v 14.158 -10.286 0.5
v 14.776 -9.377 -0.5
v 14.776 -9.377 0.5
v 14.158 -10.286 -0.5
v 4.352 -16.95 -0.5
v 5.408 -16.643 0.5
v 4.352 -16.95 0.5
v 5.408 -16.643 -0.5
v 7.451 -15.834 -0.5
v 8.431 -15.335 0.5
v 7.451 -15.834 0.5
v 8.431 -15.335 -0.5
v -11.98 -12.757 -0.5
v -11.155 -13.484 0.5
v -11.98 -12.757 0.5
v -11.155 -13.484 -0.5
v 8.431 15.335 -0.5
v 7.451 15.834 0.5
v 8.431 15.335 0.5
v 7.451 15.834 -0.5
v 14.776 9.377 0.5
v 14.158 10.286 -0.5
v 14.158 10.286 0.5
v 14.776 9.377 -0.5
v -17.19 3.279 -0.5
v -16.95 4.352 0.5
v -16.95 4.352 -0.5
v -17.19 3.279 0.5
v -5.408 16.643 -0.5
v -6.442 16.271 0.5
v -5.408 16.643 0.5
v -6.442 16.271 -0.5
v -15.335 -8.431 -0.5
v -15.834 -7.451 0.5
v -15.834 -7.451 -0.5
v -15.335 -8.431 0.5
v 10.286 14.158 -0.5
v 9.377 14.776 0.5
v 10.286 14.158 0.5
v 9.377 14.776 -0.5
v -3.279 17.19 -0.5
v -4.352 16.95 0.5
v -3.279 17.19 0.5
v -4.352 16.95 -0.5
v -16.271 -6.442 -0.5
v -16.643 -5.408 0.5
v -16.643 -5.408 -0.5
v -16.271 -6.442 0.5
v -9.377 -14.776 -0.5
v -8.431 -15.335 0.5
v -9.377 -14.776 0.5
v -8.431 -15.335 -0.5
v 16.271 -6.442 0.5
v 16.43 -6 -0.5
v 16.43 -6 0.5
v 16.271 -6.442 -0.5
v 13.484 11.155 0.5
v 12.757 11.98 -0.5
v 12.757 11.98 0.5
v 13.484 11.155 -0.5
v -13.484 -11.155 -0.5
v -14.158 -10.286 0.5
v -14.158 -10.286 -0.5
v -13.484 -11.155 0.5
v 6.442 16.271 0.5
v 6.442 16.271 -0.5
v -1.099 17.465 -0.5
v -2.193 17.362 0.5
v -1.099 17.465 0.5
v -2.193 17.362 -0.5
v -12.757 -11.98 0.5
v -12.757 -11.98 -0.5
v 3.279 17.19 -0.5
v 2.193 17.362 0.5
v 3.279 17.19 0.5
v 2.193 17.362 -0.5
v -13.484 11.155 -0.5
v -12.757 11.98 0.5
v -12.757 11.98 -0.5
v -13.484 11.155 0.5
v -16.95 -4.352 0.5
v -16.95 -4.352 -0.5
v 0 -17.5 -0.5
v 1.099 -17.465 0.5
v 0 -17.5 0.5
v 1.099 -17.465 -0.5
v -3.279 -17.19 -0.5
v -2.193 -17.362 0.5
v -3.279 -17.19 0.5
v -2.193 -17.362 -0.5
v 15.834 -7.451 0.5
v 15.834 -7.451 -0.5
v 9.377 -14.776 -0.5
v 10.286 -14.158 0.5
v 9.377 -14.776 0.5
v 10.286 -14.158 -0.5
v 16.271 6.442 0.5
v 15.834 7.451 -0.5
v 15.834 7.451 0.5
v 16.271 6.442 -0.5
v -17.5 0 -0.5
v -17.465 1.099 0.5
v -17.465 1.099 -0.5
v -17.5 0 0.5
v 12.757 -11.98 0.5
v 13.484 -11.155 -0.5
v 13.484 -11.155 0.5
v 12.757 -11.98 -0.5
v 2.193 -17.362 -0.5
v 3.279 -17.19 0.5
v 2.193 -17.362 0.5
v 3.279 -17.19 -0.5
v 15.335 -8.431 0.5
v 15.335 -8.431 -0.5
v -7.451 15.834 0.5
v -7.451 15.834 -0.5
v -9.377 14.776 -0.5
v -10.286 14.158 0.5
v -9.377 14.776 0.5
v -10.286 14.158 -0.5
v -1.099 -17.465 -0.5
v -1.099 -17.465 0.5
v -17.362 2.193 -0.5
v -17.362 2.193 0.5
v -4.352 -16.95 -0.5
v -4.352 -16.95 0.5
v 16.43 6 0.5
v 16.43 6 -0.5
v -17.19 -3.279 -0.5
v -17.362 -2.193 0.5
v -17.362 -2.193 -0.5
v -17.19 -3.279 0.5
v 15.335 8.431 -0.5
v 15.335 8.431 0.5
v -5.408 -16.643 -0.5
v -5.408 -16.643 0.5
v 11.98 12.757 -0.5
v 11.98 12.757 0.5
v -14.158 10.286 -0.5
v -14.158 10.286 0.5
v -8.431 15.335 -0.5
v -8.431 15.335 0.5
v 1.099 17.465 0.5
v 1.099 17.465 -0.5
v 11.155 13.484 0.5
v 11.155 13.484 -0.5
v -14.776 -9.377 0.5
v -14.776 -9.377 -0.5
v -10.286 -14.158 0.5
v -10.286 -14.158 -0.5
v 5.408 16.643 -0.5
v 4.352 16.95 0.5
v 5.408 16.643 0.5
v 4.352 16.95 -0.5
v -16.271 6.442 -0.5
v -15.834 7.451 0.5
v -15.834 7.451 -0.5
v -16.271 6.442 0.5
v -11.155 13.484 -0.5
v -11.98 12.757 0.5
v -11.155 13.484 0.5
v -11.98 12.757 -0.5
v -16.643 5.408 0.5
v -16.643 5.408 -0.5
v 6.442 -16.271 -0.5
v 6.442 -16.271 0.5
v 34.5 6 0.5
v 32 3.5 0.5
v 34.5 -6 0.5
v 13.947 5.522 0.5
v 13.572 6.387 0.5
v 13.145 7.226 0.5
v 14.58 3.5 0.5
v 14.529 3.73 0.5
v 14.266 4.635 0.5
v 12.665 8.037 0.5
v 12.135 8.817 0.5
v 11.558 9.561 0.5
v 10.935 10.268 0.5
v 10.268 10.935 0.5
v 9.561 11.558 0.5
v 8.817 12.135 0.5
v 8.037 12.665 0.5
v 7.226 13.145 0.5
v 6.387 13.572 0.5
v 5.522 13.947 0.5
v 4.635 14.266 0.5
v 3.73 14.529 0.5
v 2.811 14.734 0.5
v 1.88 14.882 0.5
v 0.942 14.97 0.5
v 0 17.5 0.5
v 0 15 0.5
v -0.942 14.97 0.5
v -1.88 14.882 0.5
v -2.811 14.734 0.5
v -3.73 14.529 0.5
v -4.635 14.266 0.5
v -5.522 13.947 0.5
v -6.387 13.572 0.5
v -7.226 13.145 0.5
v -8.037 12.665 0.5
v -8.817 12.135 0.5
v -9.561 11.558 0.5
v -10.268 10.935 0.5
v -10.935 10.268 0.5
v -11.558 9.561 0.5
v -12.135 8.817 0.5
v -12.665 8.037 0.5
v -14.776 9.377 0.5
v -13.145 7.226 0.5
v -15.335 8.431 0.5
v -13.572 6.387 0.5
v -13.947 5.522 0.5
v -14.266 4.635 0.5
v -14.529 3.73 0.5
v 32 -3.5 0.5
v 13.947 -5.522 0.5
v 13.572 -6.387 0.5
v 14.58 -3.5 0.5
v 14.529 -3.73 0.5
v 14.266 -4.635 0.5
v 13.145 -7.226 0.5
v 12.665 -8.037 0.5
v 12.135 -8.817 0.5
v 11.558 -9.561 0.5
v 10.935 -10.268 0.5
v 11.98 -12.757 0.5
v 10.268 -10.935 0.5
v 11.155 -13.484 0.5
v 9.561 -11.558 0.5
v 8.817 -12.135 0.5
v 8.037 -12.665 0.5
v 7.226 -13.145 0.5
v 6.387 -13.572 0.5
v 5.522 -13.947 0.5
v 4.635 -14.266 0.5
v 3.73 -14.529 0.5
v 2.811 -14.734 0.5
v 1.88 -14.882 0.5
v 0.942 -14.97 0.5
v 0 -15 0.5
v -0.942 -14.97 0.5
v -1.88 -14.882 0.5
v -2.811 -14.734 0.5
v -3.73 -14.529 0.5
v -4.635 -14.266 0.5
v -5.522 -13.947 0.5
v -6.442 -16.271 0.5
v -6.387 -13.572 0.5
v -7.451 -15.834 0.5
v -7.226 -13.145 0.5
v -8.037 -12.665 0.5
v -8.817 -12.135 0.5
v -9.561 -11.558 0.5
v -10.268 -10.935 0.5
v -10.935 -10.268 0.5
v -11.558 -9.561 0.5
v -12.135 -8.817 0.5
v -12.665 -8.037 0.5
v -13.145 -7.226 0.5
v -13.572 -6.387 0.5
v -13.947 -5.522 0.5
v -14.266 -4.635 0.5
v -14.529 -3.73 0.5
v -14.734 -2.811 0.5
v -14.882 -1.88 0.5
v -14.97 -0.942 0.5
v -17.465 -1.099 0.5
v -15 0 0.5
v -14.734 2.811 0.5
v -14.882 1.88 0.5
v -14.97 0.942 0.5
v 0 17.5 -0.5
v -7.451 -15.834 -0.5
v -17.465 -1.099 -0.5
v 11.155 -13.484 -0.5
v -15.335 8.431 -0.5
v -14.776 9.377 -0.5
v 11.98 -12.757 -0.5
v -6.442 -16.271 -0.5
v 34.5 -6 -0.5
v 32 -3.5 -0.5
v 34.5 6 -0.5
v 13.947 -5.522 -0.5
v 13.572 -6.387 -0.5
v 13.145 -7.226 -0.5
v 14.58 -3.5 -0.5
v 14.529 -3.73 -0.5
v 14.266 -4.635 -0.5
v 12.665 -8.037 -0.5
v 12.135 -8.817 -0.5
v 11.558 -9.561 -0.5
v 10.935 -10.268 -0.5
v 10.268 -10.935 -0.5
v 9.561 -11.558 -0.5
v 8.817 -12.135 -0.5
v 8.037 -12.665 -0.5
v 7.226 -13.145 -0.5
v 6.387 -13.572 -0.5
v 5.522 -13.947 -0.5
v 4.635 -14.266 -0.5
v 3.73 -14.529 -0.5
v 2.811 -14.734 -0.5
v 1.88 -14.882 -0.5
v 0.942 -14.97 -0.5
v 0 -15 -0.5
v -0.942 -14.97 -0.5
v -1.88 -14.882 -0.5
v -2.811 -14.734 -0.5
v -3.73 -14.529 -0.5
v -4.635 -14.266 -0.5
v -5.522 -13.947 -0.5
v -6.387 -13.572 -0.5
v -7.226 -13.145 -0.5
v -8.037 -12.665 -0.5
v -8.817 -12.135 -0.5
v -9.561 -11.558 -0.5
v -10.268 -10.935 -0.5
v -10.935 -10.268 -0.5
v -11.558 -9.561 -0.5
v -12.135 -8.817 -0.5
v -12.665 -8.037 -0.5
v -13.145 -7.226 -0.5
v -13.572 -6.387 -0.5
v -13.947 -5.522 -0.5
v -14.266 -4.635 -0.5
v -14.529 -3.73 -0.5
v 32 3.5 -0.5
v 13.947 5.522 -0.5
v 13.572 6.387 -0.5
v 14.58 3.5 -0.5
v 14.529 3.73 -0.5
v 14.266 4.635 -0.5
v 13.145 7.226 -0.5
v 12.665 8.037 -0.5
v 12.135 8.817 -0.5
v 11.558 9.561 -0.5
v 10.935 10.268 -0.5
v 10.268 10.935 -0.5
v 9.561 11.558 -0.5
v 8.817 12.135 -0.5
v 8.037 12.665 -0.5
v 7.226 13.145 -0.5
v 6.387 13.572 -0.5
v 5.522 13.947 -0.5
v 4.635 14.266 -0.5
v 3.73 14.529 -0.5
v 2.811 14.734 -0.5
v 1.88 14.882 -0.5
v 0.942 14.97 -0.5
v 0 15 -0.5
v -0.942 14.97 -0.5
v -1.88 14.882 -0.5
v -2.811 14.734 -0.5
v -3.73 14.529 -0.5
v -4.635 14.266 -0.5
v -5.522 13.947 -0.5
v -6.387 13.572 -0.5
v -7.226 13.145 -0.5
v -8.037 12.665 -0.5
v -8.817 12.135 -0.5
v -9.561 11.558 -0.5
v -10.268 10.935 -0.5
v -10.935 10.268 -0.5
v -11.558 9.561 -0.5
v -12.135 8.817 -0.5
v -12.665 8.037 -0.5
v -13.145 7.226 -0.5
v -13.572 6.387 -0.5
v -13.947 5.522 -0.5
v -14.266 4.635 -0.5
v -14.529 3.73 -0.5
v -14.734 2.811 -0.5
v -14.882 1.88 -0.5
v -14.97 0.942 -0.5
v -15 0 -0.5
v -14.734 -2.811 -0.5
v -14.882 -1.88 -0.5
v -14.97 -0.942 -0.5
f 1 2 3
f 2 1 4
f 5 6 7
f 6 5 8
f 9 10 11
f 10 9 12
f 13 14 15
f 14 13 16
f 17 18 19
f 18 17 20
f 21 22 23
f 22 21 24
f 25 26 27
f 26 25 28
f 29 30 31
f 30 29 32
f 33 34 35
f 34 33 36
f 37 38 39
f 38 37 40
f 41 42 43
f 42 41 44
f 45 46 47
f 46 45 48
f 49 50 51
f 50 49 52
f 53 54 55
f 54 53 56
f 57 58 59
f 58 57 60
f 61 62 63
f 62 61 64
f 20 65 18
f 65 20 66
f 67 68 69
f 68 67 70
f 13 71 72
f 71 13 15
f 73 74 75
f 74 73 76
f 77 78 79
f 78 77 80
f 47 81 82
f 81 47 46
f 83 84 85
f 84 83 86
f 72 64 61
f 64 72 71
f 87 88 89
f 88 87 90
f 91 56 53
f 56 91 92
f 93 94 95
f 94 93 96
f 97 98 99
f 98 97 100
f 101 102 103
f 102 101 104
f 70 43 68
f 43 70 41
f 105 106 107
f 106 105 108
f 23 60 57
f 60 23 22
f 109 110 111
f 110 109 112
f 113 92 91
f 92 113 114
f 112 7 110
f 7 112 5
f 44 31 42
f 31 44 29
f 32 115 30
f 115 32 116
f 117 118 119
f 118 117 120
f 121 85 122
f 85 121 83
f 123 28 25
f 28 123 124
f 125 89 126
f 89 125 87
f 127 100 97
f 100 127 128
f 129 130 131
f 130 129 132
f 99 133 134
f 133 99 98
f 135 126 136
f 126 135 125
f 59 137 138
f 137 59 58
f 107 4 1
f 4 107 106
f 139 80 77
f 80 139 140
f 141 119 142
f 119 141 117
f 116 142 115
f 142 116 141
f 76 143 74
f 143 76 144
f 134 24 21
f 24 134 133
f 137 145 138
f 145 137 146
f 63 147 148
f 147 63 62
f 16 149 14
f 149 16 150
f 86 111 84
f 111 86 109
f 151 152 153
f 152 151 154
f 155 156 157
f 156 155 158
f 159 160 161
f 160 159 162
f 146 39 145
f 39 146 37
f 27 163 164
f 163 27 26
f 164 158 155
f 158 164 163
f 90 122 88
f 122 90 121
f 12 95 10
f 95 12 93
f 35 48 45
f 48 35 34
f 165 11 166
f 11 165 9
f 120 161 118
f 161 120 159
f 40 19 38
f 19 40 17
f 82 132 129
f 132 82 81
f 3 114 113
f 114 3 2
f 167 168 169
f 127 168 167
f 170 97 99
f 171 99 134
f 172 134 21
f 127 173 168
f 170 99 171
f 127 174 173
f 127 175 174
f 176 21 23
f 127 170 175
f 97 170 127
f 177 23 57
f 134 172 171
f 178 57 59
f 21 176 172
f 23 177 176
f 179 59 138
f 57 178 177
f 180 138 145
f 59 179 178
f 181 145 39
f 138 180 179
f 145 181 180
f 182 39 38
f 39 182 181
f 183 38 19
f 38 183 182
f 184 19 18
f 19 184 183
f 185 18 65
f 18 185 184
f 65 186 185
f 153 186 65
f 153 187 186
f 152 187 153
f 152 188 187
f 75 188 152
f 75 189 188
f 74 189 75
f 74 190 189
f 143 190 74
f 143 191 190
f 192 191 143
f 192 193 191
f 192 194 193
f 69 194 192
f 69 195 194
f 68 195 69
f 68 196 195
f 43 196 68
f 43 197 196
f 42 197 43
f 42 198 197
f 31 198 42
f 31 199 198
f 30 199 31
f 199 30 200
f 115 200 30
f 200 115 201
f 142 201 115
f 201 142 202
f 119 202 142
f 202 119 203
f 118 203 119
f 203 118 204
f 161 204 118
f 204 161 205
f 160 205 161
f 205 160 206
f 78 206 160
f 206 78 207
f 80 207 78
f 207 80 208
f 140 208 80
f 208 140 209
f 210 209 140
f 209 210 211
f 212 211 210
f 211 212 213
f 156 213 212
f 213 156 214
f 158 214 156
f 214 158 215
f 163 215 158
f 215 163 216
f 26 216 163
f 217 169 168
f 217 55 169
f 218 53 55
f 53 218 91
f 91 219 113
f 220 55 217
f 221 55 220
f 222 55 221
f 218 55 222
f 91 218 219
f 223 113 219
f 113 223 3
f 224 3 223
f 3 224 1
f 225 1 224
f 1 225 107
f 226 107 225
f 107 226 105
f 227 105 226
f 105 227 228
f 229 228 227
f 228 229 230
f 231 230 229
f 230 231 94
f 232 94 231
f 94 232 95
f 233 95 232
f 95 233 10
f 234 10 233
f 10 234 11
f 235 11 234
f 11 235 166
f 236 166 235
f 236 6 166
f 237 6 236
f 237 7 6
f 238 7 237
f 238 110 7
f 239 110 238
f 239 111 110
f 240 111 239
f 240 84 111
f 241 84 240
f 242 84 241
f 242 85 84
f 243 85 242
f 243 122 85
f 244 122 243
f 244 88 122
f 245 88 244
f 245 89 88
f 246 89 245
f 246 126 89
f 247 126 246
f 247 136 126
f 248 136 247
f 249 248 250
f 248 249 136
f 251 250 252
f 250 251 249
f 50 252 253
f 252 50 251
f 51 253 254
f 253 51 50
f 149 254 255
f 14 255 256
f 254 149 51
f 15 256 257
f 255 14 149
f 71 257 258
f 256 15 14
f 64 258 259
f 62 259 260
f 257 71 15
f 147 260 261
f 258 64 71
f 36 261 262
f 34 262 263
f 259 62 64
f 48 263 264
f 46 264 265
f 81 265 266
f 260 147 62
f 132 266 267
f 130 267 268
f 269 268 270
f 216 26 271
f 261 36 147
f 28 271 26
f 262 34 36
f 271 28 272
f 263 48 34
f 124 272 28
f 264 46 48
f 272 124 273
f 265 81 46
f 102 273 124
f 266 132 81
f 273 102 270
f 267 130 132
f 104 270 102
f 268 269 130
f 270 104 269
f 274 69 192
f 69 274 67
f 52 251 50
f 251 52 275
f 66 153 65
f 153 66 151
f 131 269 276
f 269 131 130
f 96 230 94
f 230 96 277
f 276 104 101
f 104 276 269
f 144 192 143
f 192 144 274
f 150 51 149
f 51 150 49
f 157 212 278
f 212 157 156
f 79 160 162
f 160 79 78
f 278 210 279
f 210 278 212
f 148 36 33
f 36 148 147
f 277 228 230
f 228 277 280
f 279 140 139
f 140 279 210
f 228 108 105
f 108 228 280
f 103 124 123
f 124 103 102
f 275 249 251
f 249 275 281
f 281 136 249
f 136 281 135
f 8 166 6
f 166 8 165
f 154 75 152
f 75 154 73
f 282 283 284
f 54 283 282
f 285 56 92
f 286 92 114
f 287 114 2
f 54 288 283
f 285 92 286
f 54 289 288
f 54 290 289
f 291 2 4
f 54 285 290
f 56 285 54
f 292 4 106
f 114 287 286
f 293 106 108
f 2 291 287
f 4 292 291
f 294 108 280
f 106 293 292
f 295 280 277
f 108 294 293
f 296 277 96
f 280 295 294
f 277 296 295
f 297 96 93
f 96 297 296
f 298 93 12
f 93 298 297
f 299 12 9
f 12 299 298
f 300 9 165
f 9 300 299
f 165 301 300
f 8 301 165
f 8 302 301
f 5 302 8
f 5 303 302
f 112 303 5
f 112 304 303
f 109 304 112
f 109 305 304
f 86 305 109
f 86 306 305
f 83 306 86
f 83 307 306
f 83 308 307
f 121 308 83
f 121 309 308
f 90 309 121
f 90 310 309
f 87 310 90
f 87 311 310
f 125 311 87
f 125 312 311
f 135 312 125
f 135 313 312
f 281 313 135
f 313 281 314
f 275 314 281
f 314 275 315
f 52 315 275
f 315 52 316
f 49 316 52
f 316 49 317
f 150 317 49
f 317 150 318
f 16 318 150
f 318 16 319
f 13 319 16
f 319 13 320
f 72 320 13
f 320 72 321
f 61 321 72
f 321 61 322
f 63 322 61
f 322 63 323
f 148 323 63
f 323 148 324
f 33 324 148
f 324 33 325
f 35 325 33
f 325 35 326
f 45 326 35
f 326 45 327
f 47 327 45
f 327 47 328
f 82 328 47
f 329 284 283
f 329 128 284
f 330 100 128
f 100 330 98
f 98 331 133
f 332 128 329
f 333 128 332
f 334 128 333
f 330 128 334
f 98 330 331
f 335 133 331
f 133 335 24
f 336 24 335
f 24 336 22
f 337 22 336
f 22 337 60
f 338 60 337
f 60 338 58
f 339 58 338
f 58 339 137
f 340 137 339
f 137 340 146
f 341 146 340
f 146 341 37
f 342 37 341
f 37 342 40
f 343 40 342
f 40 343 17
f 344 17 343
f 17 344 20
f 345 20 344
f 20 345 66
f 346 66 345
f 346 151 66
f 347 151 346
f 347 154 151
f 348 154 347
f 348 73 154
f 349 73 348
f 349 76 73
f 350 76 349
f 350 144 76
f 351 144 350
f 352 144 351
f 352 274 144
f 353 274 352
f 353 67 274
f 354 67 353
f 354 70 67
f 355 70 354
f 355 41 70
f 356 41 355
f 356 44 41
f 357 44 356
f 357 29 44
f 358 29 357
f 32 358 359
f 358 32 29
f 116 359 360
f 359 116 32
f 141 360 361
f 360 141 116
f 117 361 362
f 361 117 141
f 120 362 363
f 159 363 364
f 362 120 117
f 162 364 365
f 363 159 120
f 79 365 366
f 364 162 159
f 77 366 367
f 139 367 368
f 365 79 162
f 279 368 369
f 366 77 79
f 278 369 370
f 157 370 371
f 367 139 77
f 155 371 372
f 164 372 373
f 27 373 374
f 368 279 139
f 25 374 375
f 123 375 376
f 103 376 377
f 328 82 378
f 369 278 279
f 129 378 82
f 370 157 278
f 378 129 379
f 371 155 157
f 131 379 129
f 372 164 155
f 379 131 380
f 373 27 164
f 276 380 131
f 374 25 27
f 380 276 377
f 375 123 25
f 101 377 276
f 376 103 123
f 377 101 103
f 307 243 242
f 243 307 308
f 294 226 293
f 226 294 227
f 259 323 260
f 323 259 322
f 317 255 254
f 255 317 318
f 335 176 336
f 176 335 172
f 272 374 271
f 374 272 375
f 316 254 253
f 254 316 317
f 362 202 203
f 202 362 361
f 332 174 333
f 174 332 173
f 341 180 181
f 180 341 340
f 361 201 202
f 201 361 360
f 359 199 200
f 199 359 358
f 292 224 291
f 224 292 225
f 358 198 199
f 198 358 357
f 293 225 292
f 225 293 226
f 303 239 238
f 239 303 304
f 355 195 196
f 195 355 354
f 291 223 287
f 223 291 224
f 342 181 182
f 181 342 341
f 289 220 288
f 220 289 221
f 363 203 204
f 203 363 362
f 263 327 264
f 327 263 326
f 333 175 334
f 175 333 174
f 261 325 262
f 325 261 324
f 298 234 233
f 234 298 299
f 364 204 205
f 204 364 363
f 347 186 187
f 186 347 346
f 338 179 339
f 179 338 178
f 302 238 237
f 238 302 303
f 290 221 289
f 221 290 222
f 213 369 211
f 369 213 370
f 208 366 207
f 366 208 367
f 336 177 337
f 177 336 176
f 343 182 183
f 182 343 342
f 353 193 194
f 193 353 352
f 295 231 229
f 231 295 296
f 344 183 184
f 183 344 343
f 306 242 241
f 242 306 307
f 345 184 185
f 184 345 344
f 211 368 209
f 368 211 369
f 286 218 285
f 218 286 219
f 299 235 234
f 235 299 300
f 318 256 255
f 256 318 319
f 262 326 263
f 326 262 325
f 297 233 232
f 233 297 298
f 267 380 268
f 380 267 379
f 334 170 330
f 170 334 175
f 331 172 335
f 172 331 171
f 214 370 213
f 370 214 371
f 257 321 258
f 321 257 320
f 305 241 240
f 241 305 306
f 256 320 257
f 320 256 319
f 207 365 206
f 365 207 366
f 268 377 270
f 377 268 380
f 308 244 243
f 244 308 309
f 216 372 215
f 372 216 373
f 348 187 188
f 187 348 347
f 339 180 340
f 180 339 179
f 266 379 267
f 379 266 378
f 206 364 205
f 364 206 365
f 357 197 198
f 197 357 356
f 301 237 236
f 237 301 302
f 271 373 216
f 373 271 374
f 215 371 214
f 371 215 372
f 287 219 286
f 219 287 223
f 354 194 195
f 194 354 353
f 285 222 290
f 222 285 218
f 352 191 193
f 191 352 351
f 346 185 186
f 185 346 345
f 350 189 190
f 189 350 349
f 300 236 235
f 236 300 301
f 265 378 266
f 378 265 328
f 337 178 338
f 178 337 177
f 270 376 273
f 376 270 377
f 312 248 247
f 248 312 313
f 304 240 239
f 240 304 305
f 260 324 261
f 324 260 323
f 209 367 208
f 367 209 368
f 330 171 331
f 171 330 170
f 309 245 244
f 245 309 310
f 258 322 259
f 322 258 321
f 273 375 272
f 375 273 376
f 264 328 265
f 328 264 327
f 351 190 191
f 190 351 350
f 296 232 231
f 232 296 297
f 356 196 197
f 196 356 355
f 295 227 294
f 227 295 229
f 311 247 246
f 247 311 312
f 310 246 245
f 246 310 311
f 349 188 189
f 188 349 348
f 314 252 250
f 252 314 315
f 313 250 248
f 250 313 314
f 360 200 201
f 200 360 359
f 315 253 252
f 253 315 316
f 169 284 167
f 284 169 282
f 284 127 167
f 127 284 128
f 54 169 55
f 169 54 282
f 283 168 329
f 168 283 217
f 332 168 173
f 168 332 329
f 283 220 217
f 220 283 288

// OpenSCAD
$fn=100;
rim=2.5;
thickness=1;
internaldiameter=30;
internalkeybody=7;
externalkeybody=7+(rim*2);
keybodylength=17;
lip=2.5;
lipthickness=1;



module keyhandle() {
difference(){
    cylinder(h=thickness, d=internaldiameter+(rim*2), center=true);
    cylinder(h=thickness*2, d=internaldiameter, center=true);
}
}


module keybody(){
difference() {
translate([(internaldiameter/2),-externalkeybody/2,-thickness/2]){
    color ([0,0,1]) cube([keybodylength+(rim),internalkeybody+(rim*2),thickness]);
}



}

}

difference(){
union(){
    keyhandle();
    keybody();
}
translate([(internaldiameter/2-rim),-internalkeybody/2,-thickness]){
    color ([1,0,0]) cube([keybodylength+rim,internalkeybody,thickness*2]);
}
}
